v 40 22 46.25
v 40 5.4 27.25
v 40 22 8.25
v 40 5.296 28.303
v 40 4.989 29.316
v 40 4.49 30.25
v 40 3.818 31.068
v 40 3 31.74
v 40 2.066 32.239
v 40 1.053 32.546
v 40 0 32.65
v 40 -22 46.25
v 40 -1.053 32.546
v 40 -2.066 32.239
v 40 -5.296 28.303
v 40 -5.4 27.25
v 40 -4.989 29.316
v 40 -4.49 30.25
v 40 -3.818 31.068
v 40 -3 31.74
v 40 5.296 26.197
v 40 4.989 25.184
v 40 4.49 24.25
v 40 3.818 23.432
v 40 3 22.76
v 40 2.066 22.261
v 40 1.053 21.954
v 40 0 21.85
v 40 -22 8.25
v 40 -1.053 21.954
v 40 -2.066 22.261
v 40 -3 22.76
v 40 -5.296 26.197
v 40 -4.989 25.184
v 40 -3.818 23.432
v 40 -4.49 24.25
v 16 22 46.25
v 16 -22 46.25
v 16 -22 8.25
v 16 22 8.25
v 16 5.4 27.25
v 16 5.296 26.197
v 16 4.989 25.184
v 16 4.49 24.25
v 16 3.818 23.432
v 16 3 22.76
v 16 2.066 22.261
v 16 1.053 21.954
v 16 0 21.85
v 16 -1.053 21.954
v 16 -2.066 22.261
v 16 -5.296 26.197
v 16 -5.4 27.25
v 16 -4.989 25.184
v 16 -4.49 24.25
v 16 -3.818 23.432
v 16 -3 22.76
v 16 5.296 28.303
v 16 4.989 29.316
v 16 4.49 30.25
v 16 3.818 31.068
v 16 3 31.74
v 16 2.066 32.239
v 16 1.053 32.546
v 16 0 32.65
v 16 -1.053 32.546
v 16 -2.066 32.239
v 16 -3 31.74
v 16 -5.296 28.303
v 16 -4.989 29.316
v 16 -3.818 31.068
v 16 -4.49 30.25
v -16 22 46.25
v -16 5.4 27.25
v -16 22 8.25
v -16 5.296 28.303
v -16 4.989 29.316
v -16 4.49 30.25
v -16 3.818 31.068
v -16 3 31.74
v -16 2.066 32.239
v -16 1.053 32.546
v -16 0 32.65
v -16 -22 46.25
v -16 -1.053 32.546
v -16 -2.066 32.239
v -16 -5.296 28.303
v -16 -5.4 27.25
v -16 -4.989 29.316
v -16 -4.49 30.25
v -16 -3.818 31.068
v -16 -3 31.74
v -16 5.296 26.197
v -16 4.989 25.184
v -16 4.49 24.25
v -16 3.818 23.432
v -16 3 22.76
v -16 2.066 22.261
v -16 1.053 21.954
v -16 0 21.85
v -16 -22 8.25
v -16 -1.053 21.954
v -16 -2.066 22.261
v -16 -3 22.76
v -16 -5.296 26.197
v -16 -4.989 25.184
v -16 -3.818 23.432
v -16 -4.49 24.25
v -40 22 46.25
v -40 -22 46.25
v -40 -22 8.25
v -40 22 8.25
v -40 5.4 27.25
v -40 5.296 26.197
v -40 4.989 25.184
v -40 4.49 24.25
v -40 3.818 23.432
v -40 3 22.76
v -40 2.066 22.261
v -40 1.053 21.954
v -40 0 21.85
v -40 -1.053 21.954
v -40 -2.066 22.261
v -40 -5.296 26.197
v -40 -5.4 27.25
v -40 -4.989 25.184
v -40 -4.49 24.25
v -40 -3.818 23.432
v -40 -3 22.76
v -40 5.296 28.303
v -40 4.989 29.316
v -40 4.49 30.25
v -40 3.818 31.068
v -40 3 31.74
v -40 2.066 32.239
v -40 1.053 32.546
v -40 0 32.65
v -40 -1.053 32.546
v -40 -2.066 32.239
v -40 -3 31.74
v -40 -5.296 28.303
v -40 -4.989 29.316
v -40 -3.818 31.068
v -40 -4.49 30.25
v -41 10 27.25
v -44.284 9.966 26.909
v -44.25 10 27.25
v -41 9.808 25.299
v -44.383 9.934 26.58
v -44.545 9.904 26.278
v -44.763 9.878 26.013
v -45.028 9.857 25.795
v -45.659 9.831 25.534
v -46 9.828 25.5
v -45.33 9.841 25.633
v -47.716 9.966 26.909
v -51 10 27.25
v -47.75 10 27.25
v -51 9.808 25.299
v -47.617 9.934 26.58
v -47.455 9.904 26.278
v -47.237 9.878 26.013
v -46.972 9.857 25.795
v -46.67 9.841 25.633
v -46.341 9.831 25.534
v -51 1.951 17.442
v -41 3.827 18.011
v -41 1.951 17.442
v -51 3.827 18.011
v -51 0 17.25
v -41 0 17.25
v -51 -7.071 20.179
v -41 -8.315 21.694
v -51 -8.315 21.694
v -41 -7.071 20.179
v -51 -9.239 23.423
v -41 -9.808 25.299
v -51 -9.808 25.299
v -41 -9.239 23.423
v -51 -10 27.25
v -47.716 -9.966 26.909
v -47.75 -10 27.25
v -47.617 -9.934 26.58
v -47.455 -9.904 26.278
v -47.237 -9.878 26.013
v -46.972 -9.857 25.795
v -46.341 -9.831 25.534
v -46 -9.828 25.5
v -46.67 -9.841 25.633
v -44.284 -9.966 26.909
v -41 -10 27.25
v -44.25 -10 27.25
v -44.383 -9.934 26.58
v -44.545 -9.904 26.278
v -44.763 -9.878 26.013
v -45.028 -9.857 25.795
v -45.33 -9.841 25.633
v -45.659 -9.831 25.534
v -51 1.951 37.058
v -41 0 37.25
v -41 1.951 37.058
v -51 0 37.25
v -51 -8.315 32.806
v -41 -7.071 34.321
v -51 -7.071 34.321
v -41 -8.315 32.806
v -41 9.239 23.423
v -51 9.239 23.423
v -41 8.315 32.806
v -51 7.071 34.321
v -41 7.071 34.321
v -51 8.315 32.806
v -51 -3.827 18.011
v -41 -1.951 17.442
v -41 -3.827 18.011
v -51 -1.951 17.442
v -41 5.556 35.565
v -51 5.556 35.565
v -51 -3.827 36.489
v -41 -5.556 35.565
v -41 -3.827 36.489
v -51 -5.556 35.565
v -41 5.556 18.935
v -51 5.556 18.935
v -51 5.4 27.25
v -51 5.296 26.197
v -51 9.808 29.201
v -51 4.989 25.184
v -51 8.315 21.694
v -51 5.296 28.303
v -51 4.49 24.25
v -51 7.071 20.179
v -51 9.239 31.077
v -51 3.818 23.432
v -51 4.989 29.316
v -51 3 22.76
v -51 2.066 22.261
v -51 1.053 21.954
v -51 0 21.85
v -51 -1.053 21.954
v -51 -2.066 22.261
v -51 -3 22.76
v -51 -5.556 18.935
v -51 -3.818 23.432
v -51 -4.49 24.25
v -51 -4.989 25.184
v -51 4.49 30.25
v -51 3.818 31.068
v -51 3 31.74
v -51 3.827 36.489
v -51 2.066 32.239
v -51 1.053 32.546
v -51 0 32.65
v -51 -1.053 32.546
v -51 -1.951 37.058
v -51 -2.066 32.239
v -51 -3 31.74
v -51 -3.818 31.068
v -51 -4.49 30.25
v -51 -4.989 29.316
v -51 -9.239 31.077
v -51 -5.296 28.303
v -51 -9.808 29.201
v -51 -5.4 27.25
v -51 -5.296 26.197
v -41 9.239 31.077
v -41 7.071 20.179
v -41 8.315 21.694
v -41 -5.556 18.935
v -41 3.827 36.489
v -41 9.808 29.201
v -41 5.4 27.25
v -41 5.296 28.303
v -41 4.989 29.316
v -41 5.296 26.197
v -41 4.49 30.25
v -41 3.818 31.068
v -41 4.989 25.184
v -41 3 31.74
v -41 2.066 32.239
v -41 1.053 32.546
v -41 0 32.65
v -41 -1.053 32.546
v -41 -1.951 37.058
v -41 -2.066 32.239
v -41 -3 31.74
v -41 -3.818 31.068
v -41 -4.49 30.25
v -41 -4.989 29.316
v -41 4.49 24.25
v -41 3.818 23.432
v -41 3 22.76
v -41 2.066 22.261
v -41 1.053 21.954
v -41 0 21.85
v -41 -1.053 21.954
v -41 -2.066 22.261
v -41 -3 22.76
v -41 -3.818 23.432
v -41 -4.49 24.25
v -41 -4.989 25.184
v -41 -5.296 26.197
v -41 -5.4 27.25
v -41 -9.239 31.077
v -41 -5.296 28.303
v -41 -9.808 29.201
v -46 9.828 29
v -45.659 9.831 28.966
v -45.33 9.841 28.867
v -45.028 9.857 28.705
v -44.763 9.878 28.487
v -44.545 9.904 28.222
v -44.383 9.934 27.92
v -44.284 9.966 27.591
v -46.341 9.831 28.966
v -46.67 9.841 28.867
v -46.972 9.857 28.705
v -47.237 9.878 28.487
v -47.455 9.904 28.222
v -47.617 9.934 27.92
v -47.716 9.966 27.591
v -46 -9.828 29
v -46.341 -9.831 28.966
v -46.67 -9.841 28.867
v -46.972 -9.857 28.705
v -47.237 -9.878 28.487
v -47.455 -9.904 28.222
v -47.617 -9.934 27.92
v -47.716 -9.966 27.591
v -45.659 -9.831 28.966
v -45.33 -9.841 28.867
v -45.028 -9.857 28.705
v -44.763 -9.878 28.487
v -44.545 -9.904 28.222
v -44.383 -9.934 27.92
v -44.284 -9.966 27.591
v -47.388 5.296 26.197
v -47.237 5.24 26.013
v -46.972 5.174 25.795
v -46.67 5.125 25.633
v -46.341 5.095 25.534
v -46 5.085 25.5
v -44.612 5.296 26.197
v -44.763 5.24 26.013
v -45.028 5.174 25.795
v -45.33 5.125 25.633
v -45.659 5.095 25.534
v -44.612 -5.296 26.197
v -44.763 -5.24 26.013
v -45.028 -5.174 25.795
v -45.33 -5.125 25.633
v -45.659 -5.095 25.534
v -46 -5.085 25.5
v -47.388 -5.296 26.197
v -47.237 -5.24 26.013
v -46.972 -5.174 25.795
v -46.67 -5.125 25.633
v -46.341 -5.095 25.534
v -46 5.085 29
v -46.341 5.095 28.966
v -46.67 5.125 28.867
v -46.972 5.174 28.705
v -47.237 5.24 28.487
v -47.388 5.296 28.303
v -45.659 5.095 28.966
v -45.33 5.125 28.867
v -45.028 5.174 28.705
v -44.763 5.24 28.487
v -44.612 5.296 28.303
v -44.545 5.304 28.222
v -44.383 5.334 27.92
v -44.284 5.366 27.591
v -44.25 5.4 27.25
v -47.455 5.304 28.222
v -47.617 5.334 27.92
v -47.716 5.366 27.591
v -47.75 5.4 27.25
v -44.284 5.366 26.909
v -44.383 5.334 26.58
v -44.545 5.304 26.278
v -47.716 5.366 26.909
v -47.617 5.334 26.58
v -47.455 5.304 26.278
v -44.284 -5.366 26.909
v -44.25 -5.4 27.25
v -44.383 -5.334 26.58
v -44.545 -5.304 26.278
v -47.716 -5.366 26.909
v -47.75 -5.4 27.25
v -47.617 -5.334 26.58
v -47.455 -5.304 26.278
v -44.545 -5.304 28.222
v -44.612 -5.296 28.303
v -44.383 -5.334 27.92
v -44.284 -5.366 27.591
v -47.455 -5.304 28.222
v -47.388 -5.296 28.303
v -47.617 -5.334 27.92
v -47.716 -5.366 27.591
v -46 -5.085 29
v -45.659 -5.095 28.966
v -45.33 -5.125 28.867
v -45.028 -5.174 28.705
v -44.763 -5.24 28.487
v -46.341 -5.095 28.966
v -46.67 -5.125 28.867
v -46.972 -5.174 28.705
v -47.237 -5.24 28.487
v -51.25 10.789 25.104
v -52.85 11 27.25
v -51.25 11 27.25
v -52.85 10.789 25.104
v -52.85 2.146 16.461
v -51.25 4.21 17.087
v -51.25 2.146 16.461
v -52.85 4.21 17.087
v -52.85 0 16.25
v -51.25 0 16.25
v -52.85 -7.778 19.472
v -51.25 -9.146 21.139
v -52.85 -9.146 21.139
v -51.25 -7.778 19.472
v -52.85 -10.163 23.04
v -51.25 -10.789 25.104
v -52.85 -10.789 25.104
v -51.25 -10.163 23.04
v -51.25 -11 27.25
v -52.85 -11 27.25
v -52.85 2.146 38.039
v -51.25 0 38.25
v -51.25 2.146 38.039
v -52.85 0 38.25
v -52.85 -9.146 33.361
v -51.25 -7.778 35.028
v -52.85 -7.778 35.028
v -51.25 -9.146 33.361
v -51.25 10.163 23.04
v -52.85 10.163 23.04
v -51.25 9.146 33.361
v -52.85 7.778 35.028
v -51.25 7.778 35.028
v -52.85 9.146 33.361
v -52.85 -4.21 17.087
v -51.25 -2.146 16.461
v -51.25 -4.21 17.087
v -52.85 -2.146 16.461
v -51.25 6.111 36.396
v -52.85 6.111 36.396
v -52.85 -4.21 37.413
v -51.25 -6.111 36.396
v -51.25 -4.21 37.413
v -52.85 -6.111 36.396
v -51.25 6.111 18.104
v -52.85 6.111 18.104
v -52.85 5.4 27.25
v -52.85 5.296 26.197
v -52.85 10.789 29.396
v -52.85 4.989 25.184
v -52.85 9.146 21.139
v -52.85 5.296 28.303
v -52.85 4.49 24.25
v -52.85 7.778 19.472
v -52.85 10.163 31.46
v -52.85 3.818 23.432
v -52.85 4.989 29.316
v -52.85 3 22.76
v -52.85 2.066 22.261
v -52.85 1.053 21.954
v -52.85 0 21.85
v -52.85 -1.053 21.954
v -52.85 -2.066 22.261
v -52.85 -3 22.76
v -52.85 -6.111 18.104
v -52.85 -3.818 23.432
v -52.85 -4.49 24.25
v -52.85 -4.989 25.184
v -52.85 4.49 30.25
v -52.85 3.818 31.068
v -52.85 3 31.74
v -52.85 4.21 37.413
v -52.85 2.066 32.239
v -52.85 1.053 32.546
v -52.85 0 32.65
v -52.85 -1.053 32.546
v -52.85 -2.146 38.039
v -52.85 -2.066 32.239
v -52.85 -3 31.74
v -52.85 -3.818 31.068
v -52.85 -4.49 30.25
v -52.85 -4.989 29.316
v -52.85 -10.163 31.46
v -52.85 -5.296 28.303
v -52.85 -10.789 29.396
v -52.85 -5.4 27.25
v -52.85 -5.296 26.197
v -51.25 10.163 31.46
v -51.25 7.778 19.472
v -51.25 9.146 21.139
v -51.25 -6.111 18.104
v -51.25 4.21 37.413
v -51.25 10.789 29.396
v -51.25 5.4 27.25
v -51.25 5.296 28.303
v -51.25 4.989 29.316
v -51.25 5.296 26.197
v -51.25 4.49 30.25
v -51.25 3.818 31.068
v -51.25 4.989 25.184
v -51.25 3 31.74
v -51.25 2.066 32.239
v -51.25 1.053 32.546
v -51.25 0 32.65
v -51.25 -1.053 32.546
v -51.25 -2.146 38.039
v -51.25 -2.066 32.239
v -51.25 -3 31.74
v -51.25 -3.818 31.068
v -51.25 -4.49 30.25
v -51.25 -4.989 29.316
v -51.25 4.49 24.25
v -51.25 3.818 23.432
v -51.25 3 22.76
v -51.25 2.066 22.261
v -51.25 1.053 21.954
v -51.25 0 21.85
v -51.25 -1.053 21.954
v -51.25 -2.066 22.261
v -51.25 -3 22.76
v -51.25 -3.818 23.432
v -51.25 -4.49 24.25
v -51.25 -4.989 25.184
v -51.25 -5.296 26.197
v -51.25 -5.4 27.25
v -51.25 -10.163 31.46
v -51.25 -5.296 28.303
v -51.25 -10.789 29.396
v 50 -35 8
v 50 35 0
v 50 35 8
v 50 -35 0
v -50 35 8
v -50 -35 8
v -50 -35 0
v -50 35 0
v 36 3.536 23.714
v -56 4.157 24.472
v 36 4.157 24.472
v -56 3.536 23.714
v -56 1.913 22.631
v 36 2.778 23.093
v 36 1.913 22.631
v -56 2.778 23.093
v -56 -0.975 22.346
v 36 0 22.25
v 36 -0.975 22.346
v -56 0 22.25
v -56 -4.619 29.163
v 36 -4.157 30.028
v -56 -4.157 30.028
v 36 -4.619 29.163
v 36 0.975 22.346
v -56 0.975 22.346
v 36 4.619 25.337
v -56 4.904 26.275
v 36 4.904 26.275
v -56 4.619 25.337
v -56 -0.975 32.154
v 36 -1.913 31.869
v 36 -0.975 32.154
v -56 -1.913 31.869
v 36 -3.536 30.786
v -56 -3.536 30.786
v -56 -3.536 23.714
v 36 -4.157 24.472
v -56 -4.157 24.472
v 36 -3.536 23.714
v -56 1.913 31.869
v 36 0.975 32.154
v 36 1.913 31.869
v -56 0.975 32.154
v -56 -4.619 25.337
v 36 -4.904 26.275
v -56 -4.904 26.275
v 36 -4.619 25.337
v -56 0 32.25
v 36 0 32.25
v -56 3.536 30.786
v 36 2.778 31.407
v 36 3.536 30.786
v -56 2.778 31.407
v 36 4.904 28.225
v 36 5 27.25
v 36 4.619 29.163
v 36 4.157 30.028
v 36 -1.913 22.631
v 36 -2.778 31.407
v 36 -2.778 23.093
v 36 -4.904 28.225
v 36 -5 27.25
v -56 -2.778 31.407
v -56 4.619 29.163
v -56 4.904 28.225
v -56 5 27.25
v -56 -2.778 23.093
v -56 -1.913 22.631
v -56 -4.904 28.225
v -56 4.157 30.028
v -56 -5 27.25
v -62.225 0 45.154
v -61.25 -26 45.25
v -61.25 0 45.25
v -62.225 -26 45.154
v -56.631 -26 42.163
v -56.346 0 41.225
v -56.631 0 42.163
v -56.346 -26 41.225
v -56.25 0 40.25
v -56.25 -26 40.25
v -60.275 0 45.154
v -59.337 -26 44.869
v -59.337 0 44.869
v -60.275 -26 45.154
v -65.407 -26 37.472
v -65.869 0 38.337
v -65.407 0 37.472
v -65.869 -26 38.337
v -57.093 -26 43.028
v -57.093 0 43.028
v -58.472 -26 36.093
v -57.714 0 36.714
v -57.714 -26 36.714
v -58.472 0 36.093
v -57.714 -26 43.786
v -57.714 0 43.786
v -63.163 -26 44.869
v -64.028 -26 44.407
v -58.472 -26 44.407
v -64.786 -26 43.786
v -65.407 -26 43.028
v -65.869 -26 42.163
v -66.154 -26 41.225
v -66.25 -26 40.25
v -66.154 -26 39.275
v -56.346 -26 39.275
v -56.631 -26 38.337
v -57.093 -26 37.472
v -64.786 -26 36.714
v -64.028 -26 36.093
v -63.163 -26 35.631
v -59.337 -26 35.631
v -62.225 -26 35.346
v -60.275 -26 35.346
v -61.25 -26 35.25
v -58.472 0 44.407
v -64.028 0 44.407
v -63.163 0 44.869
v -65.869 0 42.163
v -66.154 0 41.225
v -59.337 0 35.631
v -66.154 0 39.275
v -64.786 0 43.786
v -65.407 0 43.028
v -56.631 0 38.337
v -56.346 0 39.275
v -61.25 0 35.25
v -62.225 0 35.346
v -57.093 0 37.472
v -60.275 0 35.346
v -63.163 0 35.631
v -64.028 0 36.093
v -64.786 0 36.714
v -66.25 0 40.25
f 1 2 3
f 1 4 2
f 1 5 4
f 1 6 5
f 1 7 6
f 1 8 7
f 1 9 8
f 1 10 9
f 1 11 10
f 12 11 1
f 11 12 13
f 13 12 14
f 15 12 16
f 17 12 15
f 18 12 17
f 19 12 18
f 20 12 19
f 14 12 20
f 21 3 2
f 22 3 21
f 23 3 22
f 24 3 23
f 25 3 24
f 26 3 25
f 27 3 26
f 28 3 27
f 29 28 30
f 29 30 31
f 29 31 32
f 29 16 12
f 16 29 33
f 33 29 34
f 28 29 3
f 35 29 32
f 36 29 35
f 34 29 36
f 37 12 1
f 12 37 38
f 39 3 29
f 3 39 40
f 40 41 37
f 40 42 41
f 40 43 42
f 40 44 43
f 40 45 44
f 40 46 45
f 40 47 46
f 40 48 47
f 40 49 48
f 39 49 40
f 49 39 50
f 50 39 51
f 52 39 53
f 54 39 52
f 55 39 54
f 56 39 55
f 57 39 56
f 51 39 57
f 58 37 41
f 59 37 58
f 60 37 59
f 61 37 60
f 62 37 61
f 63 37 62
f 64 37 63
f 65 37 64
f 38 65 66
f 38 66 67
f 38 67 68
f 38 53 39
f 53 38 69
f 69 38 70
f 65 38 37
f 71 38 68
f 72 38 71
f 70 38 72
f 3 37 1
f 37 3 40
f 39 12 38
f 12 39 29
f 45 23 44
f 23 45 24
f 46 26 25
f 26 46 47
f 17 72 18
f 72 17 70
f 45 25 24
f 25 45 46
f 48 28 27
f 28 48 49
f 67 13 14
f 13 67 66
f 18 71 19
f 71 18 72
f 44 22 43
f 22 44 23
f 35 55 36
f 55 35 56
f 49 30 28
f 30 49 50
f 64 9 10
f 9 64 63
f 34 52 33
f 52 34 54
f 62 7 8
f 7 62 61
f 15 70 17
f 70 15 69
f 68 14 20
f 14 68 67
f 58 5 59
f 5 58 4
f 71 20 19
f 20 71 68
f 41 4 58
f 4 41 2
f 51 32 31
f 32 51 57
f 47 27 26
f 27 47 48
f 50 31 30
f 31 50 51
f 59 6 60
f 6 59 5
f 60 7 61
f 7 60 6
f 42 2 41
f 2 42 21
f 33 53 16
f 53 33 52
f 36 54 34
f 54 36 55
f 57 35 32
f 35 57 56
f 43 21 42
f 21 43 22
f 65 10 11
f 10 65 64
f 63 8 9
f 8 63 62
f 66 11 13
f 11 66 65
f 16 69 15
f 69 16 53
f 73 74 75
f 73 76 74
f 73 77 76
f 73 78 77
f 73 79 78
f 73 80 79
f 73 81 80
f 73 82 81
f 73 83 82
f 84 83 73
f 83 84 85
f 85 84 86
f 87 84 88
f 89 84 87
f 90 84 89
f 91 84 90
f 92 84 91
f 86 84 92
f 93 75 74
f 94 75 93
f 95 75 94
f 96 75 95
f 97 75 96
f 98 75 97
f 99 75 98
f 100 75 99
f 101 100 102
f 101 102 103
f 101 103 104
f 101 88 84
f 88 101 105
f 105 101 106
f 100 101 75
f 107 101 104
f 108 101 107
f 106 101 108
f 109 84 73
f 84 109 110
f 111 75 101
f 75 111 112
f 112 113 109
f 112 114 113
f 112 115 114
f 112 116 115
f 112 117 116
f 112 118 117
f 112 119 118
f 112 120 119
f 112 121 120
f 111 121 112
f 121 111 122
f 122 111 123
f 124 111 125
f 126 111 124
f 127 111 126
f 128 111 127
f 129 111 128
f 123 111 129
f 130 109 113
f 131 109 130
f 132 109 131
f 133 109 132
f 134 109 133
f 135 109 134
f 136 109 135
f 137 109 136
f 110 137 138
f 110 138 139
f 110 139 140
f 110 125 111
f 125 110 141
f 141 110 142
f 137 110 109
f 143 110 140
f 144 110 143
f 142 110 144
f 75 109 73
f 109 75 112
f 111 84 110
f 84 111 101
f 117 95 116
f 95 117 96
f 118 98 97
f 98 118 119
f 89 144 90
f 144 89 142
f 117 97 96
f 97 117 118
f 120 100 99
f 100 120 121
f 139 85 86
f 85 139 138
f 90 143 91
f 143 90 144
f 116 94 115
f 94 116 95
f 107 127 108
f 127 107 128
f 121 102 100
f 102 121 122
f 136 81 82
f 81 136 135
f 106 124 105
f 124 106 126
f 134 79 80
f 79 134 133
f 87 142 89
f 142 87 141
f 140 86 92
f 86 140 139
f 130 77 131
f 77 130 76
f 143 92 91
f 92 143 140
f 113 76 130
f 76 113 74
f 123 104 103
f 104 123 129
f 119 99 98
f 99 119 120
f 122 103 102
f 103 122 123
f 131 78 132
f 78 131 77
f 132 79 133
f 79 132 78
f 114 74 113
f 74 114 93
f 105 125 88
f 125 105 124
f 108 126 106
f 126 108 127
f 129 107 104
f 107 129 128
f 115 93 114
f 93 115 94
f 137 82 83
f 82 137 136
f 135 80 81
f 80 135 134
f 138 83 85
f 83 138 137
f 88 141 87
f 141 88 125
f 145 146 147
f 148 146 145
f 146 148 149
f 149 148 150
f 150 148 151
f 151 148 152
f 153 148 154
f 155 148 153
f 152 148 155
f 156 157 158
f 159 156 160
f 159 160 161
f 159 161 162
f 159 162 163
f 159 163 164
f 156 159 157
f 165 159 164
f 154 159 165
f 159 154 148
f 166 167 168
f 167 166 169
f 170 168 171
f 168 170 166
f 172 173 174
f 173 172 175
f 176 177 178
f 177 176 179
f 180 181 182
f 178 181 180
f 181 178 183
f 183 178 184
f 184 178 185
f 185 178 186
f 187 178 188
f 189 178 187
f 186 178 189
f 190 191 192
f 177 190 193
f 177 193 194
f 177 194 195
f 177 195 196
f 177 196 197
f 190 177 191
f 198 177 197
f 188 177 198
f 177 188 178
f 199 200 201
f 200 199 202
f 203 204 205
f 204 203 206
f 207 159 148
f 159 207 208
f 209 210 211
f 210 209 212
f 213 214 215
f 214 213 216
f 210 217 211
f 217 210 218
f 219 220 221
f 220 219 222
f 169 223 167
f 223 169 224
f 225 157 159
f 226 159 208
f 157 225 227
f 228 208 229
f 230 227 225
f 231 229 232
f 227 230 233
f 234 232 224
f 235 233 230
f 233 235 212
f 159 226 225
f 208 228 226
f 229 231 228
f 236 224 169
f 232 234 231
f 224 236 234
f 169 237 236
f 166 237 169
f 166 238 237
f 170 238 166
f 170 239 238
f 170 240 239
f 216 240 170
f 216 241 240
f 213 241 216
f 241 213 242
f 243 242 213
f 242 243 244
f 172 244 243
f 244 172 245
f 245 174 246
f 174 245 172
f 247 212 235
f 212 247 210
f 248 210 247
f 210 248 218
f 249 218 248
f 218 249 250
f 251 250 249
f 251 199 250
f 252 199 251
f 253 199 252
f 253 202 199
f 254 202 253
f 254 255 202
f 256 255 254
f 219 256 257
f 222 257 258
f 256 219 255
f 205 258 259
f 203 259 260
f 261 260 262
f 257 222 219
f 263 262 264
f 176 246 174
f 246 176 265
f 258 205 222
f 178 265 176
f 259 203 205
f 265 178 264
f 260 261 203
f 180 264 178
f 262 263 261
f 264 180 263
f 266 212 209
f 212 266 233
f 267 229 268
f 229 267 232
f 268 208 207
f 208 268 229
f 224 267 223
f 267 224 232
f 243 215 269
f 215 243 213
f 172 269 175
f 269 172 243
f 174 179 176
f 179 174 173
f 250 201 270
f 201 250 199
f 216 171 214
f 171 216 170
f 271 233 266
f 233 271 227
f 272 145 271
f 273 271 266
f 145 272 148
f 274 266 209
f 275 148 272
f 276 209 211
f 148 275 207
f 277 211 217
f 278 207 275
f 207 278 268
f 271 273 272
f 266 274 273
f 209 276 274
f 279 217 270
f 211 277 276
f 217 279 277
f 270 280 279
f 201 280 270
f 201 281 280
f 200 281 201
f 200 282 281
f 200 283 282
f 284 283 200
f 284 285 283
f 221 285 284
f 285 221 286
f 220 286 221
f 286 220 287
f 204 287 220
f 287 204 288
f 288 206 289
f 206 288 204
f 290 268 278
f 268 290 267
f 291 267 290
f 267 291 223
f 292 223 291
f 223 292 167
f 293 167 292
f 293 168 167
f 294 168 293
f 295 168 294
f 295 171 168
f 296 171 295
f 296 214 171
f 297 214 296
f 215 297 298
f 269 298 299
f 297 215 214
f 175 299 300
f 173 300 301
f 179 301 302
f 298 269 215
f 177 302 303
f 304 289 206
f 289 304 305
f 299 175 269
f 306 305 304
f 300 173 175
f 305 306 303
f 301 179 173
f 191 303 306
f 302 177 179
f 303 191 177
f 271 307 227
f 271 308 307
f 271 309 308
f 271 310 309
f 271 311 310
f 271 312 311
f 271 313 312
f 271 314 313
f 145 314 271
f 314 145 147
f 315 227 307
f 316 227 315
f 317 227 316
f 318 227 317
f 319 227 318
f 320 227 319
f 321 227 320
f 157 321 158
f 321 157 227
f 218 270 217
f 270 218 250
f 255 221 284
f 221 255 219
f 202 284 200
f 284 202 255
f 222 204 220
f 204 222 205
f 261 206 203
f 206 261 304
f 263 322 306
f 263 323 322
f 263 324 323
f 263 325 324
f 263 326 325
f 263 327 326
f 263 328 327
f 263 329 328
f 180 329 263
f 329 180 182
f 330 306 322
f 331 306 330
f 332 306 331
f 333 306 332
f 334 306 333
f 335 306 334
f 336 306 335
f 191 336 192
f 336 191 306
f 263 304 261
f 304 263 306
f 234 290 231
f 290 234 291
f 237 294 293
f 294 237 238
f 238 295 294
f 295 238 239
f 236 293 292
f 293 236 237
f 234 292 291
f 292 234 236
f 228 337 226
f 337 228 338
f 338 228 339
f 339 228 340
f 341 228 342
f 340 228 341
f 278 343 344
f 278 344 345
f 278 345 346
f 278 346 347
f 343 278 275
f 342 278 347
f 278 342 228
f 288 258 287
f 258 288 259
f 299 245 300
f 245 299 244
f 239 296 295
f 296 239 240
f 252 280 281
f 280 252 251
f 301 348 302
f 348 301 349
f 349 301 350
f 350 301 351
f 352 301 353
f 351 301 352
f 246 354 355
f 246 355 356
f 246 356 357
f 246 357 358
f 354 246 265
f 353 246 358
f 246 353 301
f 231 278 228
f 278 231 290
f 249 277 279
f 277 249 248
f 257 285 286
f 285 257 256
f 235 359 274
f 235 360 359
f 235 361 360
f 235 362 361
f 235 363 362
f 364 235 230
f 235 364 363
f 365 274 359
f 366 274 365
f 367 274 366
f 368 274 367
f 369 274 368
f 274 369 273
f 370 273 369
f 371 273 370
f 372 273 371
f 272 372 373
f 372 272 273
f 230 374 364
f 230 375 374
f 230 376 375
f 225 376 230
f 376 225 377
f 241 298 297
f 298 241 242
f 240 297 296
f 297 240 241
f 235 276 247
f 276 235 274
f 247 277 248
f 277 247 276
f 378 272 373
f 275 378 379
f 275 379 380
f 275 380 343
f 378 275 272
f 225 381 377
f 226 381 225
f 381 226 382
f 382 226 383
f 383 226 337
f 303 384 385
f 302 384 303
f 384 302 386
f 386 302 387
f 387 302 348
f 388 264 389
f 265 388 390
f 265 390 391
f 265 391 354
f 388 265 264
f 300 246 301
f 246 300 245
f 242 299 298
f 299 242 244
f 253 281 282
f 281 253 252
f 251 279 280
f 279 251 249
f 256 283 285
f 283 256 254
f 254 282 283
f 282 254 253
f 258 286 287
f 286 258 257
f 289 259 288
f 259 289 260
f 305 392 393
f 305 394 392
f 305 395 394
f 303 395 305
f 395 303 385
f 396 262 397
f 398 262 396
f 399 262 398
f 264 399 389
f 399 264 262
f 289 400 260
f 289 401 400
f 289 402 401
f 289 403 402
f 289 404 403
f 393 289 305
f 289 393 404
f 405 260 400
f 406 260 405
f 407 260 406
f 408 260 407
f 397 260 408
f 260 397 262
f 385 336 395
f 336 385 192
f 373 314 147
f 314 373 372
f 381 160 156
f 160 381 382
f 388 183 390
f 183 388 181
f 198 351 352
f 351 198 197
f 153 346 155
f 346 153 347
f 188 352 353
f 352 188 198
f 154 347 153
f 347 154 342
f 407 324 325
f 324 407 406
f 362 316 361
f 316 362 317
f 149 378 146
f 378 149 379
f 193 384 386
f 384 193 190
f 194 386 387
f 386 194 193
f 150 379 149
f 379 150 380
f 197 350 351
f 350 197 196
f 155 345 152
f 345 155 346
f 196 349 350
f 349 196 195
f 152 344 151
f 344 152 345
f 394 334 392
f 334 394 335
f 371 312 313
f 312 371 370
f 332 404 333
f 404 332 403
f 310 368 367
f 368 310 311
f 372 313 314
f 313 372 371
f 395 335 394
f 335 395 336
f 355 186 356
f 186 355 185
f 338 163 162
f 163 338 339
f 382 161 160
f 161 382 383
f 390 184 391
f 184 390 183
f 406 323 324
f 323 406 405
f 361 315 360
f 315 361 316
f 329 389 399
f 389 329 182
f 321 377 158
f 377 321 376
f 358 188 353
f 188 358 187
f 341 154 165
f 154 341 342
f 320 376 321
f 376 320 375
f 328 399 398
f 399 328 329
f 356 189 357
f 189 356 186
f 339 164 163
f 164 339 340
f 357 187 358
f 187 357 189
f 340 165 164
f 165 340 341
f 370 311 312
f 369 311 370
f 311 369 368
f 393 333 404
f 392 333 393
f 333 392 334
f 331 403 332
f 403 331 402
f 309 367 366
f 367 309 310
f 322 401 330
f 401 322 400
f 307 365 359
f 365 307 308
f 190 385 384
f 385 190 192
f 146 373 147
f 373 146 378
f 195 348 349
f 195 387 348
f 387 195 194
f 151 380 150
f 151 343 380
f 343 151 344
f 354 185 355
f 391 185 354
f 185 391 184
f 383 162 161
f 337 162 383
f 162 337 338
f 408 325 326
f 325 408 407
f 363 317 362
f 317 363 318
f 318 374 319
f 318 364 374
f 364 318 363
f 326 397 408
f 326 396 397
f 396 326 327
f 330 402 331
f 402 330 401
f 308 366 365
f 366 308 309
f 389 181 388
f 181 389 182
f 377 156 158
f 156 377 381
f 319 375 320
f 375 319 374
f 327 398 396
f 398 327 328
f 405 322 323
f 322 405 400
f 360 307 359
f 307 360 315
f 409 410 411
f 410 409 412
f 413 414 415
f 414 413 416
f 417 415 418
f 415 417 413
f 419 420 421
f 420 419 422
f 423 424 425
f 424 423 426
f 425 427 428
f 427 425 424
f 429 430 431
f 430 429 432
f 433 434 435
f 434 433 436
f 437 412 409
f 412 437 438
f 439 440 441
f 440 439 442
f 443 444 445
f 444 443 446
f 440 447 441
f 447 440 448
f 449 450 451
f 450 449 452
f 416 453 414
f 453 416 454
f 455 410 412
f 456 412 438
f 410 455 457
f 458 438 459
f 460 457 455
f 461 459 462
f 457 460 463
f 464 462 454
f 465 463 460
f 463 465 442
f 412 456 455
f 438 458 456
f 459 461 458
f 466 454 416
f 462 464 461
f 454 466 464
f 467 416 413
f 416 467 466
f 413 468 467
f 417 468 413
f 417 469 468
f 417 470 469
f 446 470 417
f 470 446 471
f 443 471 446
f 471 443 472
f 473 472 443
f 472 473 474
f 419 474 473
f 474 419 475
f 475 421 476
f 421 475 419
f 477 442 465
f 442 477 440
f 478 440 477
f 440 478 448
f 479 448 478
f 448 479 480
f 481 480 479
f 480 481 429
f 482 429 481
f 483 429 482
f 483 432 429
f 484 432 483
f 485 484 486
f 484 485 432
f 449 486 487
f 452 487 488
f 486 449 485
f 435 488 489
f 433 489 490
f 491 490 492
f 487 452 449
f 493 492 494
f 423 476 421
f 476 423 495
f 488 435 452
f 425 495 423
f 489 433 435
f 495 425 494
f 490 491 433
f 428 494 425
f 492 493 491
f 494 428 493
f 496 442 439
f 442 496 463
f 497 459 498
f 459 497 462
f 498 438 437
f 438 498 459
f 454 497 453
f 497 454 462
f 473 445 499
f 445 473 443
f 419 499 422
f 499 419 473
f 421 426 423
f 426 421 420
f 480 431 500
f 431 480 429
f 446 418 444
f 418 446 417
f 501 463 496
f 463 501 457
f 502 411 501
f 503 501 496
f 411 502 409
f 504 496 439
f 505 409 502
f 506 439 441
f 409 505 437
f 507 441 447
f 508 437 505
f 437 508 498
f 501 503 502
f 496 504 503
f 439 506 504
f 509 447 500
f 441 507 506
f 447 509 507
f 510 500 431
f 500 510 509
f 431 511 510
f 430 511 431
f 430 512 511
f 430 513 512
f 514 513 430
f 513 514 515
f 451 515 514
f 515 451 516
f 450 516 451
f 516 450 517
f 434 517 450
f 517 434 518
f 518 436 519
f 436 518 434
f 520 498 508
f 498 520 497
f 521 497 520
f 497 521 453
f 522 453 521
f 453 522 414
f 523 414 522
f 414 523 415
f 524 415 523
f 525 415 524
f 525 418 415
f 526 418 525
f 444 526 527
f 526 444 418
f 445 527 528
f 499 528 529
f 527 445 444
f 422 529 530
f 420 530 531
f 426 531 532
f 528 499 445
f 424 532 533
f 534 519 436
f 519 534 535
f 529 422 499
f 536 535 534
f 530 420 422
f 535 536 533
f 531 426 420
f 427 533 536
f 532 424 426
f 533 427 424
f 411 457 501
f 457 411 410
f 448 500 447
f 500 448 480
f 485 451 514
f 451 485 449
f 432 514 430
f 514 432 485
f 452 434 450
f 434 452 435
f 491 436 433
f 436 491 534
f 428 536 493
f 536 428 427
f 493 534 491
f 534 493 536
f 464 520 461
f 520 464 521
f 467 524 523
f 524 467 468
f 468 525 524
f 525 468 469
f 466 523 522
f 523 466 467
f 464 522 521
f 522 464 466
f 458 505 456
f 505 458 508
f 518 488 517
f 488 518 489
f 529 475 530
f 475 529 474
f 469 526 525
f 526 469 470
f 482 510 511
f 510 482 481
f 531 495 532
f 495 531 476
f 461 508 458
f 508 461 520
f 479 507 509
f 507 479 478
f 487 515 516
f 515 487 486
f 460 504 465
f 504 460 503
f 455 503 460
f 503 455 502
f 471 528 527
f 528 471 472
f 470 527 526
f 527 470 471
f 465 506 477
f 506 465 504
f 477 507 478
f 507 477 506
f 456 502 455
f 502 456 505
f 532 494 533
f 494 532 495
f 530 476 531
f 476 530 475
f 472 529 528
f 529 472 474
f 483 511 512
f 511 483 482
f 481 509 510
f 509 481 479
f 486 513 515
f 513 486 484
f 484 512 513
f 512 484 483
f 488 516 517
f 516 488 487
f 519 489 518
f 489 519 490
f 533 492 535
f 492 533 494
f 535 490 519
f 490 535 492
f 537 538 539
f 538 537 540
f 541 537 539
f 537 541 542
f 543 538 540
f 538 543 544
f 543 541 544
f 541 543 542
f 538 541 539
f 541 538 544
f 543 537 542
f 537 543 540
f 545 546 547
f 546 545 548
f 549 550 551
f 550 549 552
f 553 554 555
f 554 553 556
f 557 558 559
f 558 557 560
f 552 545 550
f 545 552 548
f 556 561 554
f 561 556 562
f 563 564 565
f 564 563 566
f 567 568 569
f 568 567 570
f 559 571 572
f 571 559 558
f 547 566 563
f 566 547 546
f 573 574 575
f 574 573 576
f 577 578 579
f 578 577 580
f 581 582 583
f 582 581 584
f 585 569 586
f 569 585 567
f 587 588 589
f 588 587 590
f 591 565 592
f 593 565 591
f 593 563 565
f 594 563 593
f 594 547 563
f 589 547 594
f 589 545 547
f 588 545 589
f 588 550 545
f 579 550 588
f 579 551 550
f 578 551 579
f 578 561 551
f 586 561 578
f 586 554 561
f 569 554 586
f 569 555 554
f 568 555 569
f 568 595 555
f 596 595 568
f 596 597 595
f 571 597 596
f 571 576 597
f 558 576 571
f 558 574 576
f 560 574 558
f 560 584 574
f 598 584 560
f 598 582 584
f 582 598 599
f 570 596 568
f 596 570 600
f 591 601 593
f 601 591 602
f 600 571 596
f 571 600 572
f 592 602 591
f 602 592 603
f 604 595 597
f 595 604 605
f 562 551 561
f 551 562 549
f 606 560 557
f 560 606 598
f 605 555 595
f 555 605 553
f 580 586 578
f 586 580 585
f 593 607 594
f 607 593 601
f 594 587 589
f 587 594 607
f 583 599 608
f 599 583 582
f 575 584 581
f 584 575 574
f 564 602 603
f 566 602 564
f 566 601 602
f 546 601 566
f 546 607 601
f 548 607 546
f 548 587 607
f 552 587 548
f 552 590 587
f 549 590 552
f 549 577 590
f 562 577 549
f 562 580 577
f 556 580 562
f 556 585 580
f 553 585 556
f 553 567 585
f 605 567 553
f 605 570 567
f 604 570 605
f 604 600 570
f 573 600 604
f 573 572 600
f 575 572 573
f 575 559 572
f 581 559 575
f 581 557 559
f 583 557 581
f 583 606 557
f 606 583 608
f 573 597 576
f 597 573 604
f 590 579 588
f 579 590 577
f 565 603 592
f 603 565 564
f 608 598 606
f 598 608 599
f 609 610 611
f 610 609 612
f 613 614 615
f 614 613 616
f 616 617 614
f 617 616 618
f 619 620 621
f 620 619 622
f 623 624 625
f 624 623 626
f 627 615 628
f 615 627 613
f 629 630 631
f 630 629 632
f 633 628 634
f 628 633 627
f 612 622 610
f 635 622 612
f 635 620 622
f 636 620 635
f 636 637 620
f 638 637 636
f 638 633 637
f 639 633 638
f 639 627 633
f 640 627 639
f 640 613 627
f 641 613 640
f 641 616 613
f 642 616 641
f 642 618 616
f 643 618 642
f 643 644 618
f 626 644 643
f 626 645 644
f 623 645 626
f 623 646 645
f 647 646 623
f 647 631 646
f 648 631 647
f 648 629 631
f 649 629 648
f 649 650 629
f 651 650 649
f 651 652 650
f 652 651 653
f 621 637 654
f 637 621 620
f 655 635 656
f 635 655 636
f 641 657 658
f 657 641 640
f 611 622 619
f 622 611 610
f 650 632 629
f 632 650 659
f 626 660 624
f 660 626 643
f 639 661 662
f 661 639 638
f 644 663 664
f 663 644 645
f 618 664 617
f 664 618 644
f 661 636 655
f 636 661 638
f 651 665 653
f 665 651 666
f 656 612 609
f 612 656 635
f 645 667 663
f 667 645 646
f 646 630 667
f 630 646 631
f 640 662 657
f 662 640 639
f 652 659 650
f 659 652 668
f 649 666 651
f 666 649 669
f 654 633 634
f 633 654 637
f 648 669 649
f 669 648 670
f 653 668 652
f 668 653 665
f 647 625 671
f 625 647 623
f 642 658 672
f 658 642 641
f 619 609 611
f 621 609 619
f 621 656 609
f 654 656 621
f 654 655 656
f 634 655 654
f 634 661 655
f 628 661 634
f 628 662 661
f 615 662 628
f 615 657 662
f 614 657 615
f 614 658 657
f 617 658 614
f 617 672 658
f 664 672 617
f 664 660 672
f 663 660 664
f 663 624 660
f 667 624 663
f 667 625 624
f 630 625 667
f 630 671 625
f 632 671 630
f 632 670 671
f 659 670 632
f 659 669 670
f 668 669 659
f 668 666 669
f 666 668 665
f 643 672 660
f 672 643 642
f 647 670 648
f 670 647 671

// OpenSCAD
$fn = 32;

// ------------------------------------------------------------------------
// Machine vise: screw d10, jaws 24 x 38 mm
// Every part is its own module, assembly() places every instance.
// ------------------------------------------------------------------------

// --- part 1 ---
module vise_bed() {
  difference() {
    translate([-50, -35, 0]) cube([100, 70, 8]);
  }
}

// --- part 2 ---
module vise_jaw() {
  difference() {
    translate([-12, -22, 0]) cube([24, 44, 38]);
    translate([0, 0, 19]) rotate([0, 90, 0]) cylinder(h = 26, d = 10.8, center = true);
  }
}

// --- part 3 ---
module vise_screw() {
  translate([0, 0, -46]) cylinder(h = 92, d = 10);
}

// --- part 4 ---
module screw_collar() {
  difference() {
    cylinder(h = 10, d = 20);
    translate([0, 0, -1]) cylinder(h = 12, d = 10.8);
    translate([0, 0, 5]) rotate([90, 0, 0]) cylinder(h = 22, d = 3.5, center = true);
  }
}

// --- part 5 ---
module screw_washer() {
  difference() {
      translate([0, 0, 0]) cylinder(h = 1.6, d = 22);
      translate([0, 0, -1]) cylinder(h = 3.6, d = 10.8);
    }
}

// --- part 6 ---
module vise_handle() {
  cylinder(h = 26, d = 10);
}

// --- assembly ---
module assembly() {
  color([0.80, 0.24, 0.20]) translate([0, 0, 0]) rotate([0, 0, 0]) vise_bed();
  color([0.20, 0.45, 0.75]) translate([28, 0, 8.25]) rotate([0, 0, 0]) vise_jaw();
  color([0.25, 0.62, 0.32]) translate([-28, 0, 8.25]) rotate([0, 0, 0]) vise_jaw();
  color([0.92, 0.70, 0.18]) translate([-10, 0, 27.25]) rotate([0, 90, 0]) vise_screw();
  color([0.58, 0.35, 0.70]) translate([-51, 0, 27.25]) rotate([0, 90, 0]) screw_collar();
  color([0.16, 0.66, 0.66]) translate([-52.85, 0, 27.25]) rotate([0, 90, 0]) screw_washer();
  color([0.85, 0.48, 0.18]) translate([-61.25, 0, 40.25]) rotate([90, 0, 0]) vise_handle();
}

assembly();
